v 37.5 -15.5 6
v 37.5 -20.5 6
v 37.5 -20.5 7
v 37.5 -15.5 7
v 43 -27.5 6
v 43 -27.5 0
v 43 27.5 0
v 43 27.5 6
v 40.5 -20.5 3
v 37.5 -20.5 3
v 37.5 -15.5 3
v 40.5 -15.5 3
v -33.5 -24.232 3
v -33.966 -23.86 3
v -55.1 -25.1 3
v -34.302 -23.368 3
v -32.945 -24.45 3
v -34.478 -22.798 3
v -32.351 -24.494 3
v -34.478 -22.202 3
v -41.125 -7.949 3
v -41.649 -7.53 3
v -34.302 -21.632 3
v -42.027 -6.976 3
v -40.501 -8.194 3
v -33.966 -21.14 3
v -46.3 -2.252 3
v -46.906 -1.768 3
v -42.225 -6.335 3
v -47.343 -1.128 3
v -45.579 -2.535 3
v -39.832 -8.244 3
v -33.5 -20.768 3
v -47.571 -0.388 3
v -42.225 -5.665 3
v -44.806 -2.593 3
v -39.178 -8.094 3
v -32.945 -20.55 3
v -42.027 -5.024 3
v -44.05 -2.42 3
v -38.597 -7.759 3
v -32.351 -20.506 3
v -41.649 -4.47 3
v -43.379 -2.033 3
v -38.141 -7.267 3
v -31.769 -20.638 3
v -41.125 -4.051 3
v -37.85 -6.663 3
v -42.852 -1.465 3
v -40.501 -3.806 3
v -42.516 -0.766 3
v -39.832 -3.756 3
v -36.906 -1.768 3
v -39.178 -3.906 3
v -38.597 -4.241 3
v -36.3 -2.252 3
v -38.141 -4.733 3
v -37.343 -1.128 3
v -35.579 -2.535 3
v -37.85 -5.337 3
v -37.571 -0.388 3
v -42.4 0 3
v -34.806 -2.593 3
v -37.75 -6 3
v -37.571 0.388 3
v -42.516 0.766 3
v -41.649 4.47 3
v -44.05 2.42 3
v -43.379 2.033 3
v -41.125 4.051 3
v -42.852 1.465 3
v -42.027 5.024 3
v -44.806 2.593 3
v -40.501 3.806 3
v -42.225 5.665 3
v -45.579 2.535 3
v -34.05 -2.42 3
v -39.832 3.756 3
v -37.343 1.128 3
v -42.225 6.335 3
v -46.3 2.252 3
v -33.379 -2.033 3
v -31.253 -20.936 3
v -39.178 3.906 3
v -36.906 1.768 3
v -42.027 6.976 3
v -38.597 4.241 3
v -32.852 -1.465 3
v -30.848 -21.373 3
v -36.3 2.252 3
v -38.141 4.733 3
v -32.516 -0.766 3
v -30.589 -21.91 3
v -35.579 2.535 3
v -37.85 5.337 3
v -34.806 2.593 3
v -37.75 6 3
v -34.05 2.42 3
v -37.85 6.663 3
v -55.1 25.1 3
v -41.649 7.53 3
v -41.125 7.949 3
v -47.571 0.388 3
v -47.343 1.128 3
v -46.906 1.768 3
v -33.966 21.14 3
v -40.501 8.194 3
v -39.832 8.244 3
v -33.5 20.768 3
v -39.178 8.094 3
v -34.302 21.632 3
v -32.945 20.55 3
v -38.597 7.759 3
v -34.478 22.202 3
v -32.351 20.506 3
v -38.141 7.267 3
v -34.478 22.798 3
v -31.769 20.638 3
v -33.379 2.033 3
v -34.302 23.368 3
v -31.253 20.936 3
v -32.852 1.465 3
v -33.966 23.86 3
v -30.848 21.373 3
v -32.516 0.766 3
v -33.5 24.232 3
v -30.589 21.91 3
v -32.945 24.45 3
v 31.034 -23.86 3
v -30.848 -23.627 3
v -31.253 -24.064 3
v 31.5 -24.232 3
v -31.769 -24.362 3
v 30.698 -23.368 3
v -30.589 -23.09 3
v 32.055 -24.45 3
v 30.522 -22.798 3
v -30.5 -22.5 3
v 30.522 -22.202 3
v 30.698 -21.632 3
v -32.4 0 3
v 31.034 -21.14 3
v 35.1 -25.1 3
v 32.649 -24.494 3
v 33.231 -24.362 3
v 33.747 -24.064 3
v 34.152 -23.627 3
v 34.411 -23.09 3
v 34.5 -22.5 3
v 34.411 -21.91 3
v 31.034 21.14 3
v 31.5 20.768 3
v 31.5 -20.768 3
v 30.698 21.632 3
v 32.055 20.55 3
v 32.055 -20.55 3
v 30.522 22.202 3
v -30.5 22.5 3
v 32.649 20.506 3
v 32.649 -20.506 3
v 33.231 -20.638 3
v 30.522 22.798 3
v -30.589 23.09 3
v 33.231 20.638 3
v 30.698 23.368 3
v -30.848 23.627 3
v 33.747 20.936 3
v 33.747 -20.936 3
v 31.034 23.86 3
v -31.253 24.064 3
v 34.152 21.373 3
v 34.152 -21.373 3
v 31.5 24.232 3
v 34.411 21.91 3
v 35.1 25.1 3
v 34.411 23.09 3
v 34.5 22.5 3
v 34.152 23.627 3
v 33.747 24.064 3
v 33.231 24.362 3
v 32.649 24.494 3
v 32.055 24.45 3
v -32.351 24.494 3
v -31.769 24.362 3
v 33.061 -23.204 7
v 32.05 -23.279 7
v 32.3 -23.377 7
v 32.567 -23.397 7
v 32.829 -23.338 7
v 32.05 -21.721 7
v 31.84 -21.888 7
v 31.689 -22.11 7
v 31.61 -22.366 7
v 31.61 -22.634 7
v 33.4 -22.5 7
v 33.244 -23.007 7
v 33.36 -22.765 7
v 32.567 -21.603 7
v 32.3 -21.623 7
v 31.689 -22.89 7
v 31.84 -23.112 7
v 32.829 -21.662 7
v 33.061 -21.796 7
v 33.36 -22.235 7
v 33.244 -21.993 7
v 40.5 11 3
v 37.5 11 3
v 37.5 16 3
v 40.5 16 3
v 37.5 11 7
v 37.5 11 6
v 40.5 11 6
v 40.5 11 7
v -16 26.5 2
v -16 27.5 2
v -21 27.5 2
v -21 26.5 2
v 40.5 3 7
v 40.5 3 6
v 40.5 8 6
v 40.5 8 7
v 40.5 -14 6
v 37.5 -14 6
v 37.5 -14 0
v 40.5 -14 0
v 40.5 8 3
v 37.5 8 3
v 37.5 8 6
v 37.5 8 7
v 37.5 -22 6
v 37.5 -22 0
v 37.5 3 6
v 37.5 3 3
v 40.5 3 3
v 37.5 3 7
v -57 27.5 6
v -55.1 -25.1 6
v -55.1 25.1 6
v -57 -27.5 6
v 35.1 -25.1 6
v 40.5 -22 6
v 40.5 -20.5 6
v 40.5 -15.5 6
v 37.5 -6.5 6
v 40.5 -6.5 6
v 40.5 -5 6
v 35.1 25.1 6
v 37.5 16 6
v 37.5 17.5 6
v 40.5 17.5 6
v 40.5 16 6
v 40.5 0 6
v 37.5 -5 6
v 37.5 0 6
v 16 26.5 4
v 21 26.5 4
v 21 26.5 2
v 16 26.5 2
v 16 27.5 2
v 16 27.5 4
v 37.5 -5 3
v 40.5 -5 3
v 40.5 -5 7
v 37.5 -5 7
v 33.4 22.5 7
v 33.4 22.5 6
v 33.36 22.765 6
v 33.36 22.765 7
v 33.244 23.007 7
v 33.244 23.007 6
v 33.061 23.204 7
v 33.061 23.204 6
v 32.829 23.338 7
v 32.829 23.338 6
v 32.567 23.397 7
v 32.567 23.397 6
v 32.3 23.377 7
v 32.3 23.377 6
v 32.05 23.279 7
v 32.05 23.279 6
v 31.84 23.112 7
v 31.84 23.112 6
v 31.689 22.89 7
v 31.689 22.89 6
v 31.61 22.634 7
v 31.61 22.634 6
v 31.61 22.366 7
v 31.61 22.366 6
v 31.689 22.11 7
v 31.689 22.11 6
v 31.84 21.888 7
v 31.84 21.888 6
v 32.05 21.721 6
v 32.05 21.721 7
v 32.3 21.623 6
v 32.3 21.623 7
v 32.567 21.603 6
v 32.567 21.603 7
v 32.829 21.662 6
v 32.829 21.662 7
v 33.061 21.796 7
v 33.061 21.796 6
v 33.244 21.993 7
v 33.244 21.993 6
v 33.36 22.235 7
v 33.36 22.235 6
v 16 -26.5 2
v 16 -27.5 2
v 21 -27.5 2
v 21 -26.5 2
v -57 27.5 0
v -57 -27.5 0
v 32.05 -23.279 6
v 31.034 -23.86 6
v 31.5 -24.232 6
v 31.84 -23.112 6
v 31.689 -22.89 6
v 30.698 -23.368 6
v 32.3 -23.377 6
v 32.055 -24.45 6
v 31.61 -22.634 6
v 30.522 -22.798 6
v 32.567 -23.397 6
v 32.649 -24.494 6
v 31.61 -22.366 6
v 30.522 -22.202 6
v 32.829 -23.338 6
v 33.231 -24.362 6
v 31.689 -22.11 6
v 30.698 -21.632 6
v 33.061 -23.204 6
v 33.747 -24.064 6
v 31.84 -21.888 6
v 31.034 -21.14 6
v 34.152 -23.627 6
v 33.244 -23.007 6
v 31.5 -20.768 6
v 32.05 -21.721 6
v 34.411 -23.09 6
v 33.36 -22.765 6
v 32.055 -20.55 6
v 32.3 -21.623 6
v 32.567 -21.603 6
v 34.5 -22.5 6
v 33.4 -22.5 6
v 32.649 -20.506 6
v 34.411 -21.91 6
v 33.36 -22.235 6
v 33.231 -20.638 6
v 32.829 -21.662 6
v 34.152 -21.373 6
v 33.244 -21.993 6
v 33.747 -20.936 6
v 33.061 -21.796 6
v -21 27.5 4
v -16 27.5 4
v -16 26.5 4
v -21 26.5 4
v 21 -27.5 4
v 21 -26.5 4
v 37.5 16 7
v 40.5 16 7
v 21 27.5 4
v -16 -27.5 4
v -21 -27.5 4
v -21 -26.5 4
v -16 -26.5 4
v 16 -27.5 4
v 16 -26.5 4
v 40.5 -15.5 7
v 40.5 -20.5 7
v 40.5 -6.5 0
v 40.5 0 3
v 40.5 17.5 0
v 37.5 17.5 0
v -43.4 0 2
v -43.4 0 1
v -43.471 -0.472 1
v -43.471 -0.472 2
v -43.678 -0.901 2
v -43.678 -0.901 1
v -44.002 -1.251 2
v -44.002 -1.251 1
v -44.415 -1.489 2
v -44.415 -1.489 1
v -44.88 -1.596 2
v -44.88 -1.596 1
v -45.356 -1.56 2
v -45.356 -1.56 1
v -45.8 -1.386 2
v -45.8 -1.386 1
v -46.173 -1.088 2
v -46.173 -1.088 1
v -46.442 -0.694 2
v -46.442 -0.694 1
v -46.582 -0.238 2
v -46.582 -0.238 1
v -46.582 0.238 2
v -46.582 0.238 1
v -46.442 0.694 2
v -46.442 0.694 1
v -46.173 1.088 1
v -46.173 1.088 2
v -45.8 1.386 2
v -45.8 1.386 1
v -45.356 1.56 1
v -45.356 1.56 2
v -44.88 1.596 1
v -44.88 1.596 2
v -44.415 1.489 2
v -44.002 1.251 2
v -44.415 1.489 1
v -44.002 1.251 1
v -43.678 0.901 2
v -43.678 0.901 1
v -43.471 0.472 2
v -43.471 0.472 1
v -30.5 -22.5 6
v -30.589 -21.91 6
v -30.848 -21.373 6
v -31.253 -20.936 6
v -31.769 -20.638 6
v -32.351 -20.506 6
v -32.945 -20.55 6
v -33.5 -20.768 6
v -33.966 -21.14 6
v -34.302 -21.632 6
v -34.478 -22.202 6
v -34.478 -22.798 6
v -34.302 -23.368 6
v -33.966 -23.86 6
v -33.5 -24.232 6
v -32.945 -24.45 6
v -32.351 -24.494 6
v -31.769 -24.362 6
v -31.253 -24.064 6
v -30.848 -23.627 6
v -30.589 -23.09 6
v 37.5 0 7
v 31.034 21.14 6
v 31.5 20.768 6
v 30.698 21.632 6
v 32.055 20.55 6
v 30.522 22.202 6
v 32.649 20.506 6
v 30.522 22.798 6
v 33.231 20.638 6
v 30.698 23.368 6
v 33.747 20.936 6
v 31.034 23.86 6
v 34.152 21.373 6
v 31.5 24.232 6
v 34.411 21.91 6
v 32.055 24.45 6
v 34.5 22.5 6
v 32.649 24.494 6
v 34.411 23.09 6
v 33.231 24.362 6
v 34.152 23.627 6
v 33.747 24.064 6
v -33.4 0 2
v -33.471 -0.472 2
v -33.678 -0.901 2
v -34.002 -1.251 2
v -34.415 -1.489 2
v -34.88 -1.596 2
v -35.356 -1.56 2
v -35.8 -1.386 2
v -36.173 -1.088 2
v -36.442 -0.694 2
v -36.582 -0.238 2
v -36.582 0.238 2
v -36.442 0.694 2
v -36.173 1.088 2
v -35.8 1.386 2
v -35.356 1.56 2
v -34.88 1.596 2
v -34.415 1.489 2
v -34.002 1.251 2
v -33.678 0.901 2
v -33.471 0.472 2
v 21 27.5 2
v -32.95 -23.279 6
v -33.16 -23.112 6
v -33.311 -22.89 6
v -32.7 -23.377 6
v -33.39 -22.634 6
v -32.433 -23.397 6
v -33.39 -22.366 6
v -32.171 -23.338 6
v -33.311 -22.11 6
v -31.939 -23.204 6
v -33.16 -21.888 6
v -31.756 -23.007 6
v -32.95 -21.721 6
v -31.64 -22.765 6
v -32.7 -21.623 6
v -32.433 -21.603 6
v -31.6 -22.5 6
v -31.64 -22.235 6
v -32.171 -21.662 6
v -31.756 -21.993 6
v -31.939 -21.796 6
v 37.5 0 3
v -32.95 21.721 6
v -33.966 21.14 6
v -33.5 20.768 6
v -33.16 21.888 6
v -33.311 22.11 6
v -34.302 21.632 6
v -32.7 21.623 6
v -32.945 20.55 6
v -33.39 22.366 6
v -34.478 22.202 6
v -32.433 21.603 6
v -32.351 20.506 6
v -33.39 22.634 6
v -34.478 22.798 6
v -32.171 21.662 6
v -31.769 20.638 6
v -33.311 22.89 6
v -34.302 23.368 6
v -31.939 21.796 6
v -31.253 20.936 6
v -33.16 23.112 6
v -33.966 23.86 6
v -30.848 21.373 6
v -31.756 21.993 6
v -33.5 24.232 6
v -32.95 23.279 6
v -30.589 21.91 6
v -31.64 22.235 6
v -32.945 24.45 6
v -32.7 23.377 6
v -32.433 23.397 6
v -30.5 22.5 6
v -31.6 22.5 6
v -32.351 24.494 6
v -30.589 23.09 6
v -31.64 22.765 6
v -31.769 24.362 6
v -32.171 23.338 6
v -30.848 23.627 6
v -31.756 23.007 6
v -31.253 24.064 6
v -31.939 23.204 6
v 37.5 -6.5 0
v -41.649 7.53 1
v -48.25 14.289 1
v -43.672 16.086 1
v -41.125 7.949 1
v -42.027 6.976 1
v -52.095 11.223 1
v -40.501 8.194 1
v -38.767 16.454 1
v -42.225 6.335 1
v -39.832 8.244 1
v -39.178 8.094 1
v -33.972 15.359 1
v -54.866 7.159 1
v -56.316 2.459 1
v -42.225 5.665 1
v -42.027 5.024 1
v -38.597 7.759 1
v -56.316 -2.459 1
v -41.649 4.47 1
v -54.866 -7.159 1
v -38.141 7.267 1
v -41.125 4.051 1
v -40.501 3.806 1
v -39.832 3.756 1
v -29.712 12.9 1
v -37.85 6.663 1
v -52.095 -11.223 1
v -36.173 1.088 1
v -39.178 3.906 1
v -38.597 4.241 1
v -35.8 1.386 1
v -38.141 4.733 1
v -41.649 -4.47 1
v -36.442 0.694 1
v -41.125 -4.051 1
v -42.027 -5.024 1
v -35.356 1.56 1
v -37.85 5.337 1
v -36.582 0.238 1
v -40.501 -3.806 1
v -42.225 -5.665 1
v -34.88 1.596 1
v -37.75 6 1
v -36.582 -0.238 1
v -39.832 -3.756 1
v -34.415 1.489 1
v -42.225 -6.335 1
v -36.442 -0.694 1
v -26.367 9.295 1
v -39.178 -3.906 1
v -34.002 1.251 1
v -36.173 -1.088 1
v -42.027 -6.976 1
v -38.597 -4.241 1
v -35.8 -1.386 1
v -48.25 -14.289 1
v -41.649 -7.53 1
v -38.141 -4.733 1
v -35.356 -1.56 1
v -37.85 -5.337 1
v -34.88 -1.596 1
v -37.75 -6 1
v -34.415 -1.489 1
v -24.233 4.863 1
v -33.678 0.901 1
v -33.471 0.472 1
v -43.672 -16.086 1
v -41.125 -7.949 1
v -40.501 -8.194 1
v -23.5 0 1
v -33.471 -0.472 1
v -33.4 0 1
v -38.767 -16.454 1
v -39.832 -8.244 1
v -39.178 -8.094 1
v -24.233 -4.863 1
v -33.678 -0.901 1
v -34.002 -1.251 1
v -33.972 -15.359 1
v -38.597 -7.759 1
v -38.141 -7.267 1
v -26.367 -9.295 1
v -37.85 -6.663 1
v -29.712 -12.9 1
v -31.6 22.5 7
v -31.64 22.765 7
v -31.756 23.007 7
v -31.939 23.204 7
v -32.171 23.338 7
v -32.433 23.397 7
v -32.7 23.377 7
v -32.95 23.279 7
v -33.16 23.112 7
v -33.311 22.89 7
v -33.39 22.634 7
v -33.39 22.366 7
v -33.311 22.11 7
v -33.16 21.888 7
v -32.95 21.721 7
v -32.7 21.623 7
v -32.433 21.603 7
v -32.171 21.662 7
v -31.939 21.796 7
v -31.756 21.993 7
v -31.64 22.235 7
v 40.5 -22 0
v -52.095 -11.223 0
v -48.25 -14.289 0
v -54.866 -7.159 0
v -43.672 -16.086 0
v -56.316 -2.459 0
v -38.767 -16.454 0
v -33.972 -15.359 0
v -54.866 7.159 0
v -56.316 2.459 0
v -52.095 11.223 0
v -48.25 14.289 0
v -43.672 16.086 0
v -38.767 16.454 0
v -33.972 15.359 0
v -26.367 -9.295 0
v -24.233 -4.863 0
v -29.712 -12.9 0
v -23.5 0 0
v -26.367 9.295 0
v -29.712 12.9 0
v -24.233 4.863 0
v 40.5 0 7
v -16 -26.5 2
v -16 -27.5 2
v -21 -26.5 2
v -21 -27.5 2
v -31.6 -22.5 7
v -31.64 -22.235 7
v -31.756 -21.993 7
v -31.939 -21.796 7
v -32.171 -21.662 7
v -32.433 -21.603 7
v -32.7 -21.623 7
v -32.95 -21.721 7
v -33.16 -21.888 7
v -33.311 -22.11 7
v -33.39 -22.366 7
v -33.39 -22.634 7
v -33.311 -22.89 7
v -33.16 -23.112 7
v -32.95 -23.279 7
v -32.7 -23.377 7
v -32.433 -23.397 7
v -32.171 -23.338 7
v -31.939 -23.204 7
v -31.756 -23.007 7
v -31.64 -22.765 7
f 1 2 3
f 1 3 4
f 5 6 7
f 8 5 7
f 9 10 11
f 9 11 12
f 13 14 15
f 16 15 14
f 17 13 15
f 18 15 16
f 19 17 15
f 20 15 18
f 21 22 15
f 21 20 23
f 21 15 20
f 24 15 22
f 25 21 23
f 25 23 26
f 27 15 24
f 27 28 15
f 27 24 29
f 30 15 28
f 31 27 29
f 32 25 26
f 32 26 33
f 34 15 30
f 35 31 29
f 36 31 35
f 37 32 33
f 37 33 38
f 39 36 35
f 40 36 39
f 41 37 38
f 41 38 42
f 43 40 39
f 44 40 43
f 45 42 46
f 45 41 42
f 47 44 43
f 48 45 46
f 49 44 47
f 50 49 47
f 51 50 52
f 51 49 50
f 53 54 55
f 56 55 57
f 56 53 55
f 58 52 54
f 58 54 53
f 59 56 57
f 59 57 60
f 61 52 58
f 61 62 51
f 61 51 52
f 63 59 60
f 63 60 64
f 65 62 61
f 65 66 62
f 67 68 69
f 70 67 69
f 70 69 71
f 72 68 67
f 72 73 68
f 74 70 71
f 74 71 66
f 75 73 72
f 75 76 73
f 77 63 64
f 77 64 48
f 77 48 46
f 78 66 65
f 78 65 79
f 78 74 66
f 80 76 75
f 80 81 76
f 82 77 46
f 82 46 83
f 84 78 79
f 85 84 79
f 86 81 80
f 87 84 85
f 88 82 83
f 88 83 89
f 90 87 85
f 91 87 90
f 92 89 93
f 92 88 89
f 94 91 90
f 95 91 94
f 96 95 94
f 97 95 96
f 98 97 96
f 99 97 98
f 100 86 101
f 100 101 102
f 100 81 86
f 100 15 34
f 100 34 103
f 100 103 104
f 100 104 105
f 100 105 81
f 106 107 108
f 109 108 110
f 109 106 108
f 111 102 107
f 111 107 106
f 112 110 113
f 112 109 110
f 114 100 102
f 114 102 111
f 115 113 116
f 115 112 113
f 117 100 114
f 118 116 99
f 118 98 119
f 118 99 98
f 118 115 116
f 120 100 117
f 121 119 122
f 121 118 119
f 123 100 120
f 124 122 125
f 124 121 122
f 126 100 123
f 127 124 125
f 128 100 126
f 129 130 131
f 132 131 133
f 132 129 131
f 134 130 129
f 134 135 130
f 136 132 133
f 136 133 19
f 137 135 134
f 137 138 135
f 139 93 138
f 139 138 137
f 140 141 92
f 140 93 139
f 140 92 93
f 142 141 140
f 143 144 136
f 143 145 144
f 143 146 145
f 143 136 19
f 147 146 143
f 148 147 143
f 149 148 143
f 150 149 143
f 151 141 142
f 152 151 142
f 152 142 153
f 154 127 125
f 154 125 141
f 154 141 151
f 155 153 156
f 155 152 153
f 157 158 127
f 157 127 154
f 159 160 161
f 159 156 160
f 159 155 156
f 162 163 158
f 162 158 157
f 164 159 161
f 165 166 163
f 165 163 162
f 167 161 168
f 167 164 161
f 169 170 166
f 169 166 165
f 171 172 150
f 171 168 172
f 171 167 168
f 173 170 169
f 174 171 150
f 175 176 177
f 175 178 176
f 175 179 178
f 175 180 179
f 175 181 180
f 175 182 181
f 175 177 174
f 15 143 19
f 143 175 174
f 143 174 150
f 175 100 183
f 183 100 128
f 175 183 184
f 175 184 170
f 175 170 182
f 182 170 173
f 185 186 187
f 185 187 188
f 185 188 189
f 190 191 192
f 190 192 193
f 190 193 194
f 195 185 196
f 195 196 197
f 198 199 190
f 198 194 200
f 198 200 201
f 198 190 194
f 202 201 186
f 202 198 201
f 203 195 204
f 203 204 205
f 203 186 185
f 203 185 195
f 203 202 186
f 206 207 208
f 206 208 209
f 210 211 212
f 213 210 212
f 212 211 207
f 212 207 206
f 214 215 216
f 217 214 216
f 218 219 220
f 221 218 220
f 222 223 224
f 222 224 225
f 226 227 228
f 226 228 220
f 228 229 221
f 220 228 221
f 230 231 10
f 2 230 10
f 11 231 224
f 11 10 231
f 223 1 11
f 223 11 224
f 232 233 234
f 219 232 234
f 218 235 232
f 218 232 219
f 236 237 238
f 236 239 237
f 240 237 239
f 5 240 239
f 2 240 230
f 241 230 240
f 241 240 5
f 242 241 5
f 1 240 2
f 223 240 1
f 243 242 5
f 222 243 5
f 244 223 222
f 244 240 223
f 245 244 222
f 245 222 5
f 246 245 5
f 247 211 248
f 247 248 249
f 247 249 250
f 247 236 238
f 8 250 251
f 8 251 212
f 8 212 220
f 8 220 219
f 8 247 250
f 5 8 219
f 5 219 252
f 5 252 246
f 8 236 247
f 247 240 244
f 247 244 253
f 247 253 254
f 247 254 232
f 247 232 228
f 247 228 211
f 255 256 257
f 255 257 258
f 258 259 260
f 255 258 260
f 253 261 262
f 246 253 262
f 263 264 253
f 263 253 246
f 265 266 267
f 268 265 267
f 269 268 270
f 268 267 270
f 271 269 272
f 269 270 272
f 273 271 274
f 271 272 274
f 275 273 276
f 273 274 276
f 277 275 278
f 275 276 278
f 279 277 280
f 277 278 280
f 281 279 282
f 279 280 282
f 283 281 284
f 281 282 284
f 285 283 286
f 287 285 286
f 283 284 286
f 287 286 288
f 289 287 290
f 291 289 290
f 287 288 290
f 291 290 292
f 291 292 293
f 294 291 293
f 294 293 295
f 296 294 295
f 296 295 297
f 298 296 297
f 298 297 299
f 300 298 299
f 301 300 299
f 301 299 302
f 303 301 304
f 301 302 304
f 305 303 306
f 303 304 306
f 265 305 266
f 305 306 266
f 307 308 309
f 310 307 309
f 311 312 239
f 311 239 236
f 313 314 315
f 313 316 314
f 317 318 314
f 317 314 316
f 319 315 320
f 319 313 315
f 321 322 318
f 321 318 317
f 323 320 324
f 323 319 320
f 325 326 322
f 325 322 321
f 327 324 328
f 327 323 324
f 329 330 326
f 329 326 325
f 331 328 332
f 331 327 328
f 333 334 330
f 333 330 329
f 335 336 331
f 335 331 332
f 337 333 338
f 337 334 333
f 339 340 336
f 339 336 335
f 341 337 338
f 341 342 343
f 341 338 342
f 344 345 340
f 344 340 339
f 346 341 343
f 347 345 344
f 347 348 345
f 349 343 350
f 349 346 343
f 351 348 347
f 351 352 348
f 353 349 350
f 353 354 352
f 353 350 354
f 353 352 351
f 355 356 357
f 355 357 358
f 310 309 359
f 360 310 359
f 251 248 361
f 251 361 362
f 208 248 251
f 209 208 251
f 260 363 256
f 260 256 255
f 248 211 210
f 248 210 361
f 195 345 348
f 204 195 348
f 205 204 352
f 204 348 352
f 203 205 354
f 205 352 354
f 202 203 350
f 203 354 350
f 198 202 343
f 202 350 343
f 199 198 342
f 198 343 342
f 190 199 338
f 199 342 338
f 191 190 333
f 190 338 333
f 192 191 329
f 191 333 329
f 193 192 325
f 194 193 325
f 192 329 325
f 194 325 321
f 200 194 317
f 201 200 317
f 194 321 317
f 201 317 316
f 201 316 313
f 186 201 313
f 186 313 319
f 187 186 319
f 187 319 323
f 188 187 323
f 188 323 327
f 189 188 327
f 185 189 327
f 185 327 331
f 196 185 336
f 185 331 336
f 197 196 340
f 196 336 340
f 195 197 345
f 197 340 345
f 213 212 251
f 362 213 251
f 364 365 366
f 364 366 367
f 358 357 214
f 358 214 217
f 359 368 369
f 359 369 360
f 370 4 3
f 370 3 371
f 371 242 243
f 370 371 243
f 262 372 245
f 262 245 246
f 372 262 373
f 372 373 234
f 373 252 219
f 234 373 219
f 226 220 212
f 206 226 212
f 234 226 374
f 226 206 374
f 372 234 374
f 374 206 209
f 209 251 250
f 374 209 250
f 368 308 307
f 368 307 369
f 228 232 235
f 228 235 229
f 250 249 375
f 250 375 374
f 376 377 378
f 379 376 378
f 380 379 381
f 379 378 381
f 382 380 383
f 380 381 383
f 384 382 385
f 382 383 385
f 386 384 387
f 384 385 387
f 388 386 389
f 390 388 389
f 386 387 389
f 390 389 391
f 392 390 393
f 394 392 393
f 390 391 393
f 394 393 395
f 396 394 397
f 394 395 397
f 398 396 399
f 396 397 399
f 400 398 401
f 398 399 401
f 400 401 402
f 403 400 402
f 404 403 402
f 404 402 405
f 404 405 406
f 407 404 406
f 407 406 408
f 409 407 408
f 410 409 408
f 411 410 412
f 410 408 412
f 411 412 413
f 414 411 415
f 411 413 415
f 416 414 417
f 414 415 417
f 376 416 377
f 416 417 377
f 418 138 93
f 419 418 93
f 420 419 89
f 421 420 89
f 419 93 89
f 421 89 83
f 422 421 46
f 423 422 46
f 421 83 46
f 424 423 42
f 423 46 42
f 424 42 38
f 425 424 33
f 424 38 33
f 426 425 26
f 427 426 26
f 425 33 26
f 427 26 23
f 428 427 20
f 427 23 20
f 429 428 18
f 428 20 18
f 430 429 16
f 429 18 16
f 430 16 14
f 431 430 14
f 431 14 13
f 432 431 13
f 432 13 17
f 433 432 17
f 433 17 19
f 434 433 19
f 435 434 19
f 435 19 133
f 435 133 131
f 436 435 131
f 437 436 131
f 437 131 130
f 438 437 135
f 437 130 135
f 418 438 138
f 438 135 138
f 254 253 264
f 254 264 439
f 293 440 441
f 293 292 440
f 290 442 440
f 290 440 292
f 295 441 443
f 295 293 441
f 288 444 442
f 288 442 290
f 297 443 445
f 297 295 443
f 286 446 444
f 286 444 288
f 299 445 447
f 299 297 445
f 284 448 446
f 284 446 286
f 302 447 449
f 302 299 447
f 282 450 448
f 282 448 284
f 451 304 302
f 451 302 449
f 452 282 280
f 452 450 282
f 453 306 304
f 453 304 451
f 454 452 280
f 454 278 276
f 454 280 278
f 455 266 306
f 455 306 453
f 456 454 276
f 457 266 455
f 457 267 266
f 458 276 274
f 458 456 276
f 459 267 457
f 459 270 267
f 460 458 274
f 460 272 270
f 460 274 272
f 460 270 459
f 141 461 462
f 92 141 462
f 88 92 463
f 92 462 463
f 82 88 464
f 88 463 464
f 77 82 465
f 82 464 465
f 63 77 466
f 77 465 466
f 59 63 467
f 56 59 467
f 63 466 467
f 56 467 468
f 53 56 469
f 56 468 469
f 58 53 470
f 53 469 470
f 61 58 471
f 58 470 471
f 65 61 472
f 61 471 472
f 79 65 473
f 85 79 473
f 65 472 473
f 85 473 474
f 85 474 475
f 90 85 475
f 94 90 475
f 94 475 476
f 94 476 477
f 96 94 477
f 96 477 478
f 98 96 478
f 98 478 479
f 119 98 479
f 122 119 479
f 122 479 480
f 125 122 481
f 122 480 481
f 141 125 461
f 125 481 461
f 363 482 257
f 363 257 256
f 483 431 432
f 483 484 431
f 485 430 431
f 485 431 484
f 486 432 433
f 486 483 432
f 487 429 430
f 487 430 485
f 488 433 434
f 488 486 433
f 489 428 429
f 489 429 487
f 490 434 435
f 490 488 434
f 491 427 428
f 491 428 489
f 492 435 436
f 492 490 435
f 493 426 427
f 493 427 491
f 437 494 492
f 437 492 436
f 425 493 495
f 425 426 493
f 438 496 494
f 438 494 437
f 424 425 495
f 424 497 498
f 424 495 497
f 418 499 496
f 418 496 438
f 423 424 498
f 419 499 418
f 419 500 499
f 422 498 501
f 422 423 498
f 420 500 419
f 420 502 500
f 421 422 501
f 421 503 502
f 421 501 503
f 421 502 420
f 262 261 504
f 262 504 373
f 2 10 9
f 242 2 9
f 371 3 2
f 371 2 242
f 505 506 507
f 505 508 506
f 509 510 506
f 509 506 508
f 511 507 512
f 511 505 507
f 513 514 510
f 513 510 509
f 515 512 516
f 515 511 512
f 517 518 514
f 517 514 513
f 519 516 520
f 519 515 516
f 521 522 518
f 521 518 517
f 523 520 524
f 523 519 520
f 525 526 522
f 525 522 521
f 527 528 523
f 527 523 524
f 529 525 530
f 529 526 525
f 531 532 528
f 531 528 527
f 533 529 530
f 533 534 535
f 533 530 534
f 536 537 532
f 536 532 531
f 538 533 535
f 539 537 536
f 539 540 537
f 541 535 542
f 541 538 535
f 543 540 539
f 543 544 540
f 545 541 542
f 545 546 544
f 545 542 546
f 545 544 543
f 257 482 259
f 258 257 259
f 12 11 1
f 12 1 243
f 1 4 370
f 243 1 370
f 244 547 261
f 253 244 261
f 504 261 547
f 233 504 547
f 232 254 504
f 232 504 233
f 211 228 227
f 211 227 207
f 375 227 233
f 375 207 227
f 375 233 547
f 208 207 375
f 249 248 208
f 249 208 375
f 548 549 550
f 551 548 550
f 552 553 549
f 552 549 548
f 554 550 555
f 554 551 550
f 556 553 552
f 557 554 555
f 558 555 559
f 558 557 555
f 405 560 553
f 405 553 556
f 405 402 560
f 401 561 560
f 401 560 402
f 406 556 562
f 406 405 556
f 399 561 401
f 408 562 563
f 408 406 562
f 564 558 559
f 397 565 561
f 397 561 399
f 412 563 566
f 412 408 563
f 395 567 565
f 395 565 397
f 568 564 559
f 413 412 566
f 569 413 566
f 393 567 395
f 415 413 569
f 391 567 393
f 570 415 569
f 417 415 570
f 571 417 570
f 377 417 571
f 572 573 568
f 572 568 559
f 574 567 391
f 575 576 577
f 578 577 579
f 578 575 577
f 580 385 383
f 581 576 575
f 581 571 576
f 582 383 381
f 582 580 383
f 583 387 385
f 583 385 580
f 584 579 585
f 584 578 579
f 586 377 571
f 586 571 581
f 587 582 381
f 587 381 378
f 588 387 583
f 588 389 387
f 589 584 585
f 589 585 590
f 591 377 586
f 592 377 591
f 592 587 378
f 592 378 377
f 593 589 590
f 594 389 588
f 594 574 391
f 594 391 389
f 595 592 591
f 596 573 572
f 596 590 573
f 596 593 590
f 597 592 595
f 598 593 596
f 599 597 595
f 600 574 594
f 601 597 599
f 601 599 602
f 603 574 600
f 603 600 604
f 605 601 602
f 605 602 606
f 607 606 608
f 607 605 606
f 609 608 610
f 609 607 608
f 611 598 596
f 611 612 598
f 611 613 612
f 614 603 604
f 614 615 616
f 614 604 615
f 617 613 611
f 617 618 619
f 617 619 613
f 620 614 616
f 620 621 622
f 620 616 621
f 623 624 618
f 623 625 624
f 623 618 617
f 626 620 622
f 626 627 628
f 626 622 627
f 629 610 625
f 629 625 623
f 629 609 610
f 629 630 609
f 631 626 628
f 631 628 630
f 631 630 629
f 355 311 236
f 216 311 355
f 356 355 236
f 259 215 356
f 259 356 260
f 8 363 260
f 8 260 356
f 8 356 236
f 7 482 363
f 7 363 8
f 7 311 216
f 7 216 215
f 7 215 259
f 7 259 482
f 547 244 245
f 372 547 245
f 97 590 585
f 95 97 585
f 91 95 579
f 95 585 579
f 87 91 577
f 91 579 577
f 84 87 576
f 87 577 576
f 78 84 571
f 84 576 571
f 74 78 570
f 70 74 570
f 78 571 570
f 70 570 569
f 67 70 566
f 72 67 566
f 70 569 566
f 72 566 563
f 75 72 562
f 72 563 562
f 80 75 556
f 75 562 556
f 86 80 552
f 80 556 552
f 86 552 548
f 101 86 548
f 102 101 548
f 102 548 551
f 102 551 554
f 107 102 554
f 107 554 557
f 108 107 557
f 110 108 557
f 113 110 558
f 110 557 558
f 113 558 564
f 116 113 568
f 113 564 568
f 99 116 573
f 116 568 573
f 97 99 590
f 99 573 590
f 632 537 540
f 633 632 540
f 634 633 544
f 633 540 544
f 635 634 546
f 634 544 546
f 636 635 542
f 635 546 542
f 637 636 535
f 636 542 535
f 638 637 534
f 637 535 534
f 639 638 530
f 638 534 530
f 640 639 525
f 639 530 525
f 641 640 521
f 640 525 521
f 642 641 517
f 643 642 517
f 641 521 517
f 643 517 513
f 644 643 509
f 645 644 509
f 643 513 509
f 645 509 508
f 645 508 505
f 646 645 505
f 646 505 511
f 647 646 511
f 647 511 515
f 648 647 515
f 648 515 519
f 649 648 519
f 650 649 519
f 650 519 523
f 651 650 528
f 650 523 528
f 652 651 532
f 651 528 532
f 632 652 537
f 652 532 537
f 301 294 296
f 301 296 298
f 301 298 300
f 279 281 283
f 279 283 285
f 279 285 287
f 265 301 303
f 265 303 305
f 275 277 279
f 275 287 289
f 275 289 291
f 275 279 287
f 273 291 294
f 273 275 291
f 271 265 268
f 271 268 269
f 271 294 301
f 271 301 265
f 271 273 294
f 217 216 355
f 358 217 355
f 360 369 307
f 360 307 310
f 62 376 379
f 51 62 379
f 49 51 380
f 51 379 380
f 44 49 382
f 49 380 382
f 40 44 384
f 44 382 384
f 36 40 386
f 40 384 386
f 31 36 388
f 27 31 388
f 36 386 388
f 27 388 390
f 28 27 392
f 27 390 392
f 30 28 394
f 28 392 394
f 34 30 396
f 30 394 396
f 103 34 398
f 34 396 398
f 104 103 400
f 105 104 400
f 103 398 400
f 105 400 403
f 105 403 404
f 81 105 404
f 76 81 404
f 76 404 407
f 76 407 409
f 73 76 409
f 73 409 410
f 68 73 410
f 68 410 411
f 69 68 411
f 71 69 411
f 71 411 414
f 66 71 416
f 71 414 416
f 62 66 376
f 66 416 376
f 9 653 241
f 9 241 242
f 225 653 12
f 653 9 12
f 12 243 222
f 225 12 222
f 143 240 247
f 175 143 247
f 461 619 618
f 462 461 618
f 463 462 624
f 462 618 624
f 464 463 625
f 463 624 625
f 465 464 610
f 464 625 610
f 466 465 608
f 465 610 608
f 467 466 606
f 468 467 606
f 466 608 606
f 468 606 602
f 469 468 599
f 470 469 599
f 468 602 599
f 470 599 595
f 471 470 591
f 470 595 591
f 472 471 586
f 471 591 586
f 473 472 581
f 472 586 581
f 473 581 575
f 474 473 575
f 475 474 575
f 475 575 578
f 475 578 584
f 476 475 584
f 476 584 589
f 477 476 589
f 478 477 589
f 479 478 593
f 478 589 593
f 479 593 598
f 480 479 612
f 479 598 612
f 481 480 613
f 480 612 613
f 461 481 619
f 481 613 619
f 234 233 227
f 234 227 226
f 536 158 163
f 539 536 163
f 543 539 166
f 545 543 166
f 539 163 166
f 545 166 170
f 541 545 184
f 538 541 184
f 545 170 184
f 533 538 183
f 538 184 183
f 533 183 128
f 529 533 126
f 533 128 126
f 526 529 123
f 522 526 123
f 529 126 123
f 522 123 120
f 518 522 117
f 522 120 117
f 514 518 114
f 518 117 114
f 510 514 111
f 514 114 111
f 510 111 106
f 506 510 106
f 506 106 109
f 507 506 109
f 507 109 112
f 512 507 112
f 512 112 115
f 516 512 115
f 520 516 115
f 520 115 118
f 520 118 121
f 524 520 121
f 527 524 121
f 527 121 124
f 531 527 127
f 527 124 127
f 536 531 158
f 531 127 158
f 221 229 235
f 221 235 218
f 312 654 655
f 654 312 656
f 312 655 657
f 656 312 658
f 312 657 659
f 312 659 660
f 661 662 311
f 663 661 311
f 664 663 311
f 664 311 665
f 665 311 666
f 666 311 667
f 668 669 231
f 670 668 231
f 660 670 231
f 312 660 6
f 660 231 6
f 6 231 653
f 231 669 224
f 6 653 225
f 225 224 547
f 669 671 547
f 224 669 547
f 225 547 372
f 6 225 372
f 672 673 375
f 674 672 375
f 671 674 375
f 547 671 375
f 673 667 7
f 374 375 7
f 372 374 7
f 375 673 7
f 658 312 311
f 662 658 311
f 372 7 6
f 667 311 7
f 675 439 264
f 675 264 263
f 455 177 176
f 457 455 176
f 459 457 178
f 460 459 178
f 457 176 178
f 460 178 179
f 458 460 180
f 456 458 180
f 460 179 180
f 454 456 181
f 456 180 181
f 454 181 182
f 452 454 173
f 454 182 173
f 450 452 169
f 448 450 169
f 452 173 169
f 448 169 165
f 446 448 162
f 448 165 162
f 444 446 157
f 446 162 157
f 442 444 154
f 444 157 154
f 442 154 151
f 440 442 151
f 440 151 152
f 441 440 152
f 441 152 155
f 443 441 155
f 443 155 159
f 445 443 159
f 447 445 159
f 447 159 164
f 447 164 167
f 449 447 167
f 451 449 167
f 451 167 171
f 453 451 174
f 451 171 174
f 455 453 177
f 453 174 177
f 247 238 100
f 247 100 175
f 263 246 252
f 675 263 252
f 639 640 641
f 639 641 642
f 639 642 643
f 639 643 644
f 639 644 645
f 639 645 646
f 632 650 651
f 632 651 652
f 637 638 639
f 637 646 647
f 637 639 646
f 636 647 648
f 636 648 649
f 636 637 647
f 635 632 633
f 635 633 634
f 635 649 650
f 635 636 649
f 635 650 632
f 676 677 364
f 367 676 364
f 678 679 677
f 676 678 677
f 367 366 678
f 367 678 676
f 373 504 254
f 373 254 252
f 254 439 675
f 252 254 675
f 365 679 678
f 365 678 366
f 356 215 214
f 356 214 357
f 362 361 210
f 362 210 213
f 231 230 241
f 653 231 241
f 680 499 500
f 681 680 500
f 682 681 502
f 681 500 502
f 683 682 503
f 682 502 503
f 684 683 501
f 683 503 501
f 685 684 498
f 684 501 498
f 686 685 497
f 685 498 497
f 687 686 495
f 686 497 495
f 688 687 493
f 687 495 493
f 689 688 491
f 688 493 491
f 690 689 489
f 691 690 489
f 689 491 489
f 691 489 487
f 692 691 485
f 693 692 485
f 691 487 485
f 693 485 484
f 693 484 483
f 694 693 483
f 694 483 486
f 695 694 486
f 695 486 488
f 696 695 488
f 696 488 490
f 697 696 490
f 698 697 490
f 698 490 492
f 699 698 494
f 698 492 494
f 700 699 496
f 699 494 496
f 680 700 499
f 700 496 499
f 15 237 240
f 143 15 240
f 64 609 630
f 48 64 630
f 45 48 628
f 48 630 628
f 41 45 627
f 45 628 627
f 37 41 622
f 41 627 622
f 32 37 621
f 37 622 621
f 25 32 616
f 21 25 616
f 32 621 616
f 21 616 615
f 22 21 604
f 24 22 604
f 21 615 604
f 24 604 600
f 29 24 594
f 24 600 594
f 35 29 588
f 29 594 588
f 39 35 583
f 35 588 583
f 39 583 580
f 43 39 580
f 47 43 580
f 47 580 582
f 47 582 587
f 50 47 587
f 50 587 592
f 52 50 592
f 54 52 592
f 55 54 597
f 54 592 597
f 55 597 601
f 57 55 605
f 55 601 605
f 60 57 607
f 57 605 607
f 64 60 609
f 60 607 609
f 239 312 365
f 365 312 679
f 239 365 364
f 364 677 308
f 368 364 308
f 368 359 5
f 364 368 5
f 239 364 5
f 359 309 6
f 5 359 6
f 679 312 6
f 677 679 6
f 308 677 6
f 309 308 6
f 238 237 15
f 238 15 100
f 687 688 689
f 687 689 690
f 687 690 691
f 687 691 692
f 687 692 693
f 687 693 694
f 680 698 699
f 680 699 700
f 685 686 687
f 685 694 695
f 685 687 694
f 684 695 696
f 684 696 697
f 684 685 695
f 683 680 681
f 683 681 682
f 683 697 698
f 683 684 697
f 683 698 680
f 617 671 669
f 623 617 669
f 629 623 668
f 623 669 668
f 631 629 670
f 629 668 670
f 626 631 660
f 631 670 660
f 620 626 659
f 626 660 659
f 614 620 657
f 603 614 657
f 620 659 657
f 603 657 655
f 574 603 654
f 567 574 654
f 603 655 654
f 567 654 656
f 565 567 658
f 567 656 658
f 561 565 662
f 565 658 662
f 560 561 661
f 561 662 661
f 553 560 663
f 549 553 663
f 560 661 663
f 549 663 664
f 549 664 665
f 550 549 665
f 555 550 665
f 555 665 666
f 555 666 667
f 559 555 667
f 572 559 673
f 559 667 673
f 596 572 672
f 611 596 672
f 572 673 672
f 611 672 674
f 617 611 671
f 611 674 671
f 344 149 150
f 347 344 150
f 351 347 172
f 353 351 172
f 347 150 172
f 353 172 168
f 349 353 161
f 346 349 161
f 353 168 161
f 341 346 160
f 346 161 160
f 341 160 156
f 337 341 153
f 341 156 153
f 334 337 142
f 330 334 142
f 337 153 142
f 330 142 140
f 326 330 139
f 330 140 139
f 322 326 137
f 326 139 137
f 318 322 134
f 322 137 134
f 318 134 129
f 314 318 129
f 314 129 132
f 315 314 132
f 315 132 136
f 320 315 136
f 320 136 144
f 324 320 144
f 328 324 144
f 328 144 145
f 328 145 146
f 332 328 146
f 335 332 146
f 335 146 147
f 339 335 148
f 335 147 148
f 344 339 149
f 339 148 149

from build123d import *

# Parameters (mm, degrees)
SKETCH_W        = 100
SKETCH_H        = 55
PAD_DEPTH       = 6
SKETCH001_W     = 90.2
SKETCH001_H     = 50.2
POCKET_DEPTH    = 3
SKETCH002_R     = 2
PAD001_DEPTH    = 3
SKETCH003_R     = 0.9
PAD002_DEPTH    = 1
SKETCH004_W     = 3
SKETCH004_H     = 1.5
SKETCH004_H_2   = 3
POCKET001_DEPTH = 6
SKETCH005_W     = 3
SKETCH005_H     = 5
SKETCH005_H_2   = 21
POCKET002_DEPTH = 3
SKETCH006_W     = 5
SKETCH006_H     = 2
POCKET003_DEPTH = 1
SKETCH007_W     = 5
SKETCH007_H     = 2
POCKET004_DEPTH = 1
SKETCH008_R     = 16.5
POCKET005_DEPTH = 1
SKETCH009_R     = 2.25
SKETCH009_R_2   = 1.6
POCKET006_DEPTH = 2
SKETCH010_W     = 3
SKETCH010_H     = 5
PAD003_DEPTH    = 1
CHAMFER_SIZE    = 1


with BuildPart() as part:
    # Sketch → Pad (new body)
    with BuildSketch(Plane.XY):
        with Locations((-7, 0)):
            Rectangle(SKETCH_W, SKETCH_H)
    extrude(amount=PAD_DEPTH)

    # Sketch001 (on Face6 of Pad) → Pocket (cut)
    with BuildSketch(Plane.XY.offset(6)):
        with Locations((-10, 0)):
            Rectangle(SKETCH001_W, SKETCH001_H)
    extrude(amount=-POCKET_DEPTH, mode=Mode.SUBTRACT)

    # Sketch002 (on Face11 of Pocket) → Pad001 (join)
    with BuildSketch(Plane.XY.offset(3)):
        with Locations((-32.5, 22.5)):
            Circle(SKETCH002_R)
        with Locations((32.5, 22.5)):
            Circle(SKETCH002_R)
        with Locations((-32.5, -22.5)):
            Circle(SKETCH002_R)
        with Locations((32.5, -22.5)):
            Circle(SKETCH002_R)
    extrude(amount=PAD001_DEPTH)

    # Sketch003 (on Face19 of Pad001) → Pad002 (join)
    with BuildSketch(Plane.XY.offset(6)):
        with Locations((-32.5, 22.5)):
            Circle(SKETCH003_R)
        with Locations((32.5, 22.5)):
            Circle(SKETCH003_R)
        with Locations((-32.5, -22.5)):
            Circle(SKETCH003_R)
        with Locations((32.5, -22.5)):
            Circle(SKETCH003_R)
    extrude(amount=PAD002_DEPTH)

    # Sketch004 (on Face5 of Pad002) → Pocket001 (cut)
    with BuildSketch(Plane.XY.offset(6)):
        with Locations((39, 16.75)):
            Rectangle(SKETCH004_W, SKETCH004_H)
        with Locations((39, 9.5)):
            Rectangle(SKETCH004_W, SKETCH004_H_2)
        with Locations((39, 1.5)):
            Rectangle(SKETCH004_W, SKETCH004_H_2)
        with Locations((39, -5.75)):
            Rectangle(SKETCH004_W, SKETCH004_H)
        with Locations((39, -14.75)):
            Rectangle(SKETCH004_W, SKETCH004_H)
        with Locations((39, -21.25)):
            Rectangle(SKETCH004_W, SKETCH004_H)
    extrude(amount=-POCKET001_DEPTH, mode=Mode.SUBTRACT)

    # Sketch005 (on Face4 of Pocket001) → Pocket002 (cut)
    with BuildSketch(Plane(origin=(0, 0, 0), x_dir=(1, 0, 0), z_dir=(0, 0, -1))):
        with Locations((39, 18)):
            Rectangle(SKETCH005_W, SKETCH005_H)
        with Locations((39, -5.5)):
            Rectangle(SKETCH005_W, SKETCH005_H_2)
    extrude(amount=-POCKET002_DEPTH, mode=Mode.SUBTRACT)

    # Sketch006 (on Face6 of Pocket002) → Pocket003 (cut)
    with BuildSketch(Plane.XZ.offset(27.5)):
        with Locations((-18.5, 3)):
            Rectangle(SKETCH006_W, SKETCH006_H)
        with Locations((18.5, 3)):
            Rectangle(SKETCH006_W, SKETCH006_H)
    extrude(amount=-POCKET003_DEPTH, mode=Mode.SUBTRACT)

    # Sketch007 (on Face1 of Pocket003) → Pocket004 (cut)
    with BuildSketch(Plane(origin=(0, 27.5, 0), x_dir=(-1, 0, 0), z_dir=(0, 1, 0))):
        with Locations((-18.5, 3)):
            Rectangle(SKETCH007_W, SKETCH007_H)
        with Locations((18.5, 3)):
            Rectangle(SKETCH007_W, SKETCH007_H)
    extrude(amount=-POCKET004_DEPTH, mode=Mode.SUBTRACT)

    # Sketch008 (on Face3 of Pocket004) → Pocket005 (cut)
    with BuildSketch(Plane(origin=(0, 0, 0), x_dir=(1, 0, 0), z_dir=(0, 0, -1))):
        with Locations((-40, 0)):
            Circle(SKETCH008_R)
    extrude(amount=-POCKET005_DEPTH, mode=Mode.SUBTRACT)

    # Sketch009 (on Face70 of Pocket005) → Pocket006 (cut)
    with BuildSketch(Plane(origin=(0, 0, 1), x_dir=(1, 0, 0), z_dir=(0, 0, -1))):
        with Locations((-40, 6)):
            Circle(SKETCH009_R)
        with Locations((-40, -6)):
            Circle(SKETCH009_R)
        with Locations((-45, 0)):
            Circle(SKETCH009_R_2)
        with Locations((-35, 0)):
            Circle(SKETCH009_R_2)
    extrude(amount=-POCKET006_DEPTH, mode=Mode.SUBTRACT)

    # Sketch010 (on Face4 of Pocket006) → Pad003 (join)
    with BuildSketch(Plane.XY.offset(6)):
        with Locations((39, 13.5)):
            Rectangle(SKETCH010_W, SKETCH010_H)
        with Locations((39, -2.5)):
            Rectangle(SKETCH010_W, SKETCH010_H)
        with Locations((39, 5.5)):
            Rectangle(SKETCH010_W, SKETCH010_H)
        with Locations((39, -18)):
            Rectangle(SKETCH010_W, SKETCH010_H)
    extrude(amount=PAD003_DEPTH)

    # Chamfer
    chamfer_edges = [part.edges().sort_by_distance(p)[0] for p in [
        (-36.6, 0, 3),
        (-46.6, 0, 3),
    ]]
    chamfer(chamfer_edges, length=CHAMFER_SIZE)


solid = part.part
